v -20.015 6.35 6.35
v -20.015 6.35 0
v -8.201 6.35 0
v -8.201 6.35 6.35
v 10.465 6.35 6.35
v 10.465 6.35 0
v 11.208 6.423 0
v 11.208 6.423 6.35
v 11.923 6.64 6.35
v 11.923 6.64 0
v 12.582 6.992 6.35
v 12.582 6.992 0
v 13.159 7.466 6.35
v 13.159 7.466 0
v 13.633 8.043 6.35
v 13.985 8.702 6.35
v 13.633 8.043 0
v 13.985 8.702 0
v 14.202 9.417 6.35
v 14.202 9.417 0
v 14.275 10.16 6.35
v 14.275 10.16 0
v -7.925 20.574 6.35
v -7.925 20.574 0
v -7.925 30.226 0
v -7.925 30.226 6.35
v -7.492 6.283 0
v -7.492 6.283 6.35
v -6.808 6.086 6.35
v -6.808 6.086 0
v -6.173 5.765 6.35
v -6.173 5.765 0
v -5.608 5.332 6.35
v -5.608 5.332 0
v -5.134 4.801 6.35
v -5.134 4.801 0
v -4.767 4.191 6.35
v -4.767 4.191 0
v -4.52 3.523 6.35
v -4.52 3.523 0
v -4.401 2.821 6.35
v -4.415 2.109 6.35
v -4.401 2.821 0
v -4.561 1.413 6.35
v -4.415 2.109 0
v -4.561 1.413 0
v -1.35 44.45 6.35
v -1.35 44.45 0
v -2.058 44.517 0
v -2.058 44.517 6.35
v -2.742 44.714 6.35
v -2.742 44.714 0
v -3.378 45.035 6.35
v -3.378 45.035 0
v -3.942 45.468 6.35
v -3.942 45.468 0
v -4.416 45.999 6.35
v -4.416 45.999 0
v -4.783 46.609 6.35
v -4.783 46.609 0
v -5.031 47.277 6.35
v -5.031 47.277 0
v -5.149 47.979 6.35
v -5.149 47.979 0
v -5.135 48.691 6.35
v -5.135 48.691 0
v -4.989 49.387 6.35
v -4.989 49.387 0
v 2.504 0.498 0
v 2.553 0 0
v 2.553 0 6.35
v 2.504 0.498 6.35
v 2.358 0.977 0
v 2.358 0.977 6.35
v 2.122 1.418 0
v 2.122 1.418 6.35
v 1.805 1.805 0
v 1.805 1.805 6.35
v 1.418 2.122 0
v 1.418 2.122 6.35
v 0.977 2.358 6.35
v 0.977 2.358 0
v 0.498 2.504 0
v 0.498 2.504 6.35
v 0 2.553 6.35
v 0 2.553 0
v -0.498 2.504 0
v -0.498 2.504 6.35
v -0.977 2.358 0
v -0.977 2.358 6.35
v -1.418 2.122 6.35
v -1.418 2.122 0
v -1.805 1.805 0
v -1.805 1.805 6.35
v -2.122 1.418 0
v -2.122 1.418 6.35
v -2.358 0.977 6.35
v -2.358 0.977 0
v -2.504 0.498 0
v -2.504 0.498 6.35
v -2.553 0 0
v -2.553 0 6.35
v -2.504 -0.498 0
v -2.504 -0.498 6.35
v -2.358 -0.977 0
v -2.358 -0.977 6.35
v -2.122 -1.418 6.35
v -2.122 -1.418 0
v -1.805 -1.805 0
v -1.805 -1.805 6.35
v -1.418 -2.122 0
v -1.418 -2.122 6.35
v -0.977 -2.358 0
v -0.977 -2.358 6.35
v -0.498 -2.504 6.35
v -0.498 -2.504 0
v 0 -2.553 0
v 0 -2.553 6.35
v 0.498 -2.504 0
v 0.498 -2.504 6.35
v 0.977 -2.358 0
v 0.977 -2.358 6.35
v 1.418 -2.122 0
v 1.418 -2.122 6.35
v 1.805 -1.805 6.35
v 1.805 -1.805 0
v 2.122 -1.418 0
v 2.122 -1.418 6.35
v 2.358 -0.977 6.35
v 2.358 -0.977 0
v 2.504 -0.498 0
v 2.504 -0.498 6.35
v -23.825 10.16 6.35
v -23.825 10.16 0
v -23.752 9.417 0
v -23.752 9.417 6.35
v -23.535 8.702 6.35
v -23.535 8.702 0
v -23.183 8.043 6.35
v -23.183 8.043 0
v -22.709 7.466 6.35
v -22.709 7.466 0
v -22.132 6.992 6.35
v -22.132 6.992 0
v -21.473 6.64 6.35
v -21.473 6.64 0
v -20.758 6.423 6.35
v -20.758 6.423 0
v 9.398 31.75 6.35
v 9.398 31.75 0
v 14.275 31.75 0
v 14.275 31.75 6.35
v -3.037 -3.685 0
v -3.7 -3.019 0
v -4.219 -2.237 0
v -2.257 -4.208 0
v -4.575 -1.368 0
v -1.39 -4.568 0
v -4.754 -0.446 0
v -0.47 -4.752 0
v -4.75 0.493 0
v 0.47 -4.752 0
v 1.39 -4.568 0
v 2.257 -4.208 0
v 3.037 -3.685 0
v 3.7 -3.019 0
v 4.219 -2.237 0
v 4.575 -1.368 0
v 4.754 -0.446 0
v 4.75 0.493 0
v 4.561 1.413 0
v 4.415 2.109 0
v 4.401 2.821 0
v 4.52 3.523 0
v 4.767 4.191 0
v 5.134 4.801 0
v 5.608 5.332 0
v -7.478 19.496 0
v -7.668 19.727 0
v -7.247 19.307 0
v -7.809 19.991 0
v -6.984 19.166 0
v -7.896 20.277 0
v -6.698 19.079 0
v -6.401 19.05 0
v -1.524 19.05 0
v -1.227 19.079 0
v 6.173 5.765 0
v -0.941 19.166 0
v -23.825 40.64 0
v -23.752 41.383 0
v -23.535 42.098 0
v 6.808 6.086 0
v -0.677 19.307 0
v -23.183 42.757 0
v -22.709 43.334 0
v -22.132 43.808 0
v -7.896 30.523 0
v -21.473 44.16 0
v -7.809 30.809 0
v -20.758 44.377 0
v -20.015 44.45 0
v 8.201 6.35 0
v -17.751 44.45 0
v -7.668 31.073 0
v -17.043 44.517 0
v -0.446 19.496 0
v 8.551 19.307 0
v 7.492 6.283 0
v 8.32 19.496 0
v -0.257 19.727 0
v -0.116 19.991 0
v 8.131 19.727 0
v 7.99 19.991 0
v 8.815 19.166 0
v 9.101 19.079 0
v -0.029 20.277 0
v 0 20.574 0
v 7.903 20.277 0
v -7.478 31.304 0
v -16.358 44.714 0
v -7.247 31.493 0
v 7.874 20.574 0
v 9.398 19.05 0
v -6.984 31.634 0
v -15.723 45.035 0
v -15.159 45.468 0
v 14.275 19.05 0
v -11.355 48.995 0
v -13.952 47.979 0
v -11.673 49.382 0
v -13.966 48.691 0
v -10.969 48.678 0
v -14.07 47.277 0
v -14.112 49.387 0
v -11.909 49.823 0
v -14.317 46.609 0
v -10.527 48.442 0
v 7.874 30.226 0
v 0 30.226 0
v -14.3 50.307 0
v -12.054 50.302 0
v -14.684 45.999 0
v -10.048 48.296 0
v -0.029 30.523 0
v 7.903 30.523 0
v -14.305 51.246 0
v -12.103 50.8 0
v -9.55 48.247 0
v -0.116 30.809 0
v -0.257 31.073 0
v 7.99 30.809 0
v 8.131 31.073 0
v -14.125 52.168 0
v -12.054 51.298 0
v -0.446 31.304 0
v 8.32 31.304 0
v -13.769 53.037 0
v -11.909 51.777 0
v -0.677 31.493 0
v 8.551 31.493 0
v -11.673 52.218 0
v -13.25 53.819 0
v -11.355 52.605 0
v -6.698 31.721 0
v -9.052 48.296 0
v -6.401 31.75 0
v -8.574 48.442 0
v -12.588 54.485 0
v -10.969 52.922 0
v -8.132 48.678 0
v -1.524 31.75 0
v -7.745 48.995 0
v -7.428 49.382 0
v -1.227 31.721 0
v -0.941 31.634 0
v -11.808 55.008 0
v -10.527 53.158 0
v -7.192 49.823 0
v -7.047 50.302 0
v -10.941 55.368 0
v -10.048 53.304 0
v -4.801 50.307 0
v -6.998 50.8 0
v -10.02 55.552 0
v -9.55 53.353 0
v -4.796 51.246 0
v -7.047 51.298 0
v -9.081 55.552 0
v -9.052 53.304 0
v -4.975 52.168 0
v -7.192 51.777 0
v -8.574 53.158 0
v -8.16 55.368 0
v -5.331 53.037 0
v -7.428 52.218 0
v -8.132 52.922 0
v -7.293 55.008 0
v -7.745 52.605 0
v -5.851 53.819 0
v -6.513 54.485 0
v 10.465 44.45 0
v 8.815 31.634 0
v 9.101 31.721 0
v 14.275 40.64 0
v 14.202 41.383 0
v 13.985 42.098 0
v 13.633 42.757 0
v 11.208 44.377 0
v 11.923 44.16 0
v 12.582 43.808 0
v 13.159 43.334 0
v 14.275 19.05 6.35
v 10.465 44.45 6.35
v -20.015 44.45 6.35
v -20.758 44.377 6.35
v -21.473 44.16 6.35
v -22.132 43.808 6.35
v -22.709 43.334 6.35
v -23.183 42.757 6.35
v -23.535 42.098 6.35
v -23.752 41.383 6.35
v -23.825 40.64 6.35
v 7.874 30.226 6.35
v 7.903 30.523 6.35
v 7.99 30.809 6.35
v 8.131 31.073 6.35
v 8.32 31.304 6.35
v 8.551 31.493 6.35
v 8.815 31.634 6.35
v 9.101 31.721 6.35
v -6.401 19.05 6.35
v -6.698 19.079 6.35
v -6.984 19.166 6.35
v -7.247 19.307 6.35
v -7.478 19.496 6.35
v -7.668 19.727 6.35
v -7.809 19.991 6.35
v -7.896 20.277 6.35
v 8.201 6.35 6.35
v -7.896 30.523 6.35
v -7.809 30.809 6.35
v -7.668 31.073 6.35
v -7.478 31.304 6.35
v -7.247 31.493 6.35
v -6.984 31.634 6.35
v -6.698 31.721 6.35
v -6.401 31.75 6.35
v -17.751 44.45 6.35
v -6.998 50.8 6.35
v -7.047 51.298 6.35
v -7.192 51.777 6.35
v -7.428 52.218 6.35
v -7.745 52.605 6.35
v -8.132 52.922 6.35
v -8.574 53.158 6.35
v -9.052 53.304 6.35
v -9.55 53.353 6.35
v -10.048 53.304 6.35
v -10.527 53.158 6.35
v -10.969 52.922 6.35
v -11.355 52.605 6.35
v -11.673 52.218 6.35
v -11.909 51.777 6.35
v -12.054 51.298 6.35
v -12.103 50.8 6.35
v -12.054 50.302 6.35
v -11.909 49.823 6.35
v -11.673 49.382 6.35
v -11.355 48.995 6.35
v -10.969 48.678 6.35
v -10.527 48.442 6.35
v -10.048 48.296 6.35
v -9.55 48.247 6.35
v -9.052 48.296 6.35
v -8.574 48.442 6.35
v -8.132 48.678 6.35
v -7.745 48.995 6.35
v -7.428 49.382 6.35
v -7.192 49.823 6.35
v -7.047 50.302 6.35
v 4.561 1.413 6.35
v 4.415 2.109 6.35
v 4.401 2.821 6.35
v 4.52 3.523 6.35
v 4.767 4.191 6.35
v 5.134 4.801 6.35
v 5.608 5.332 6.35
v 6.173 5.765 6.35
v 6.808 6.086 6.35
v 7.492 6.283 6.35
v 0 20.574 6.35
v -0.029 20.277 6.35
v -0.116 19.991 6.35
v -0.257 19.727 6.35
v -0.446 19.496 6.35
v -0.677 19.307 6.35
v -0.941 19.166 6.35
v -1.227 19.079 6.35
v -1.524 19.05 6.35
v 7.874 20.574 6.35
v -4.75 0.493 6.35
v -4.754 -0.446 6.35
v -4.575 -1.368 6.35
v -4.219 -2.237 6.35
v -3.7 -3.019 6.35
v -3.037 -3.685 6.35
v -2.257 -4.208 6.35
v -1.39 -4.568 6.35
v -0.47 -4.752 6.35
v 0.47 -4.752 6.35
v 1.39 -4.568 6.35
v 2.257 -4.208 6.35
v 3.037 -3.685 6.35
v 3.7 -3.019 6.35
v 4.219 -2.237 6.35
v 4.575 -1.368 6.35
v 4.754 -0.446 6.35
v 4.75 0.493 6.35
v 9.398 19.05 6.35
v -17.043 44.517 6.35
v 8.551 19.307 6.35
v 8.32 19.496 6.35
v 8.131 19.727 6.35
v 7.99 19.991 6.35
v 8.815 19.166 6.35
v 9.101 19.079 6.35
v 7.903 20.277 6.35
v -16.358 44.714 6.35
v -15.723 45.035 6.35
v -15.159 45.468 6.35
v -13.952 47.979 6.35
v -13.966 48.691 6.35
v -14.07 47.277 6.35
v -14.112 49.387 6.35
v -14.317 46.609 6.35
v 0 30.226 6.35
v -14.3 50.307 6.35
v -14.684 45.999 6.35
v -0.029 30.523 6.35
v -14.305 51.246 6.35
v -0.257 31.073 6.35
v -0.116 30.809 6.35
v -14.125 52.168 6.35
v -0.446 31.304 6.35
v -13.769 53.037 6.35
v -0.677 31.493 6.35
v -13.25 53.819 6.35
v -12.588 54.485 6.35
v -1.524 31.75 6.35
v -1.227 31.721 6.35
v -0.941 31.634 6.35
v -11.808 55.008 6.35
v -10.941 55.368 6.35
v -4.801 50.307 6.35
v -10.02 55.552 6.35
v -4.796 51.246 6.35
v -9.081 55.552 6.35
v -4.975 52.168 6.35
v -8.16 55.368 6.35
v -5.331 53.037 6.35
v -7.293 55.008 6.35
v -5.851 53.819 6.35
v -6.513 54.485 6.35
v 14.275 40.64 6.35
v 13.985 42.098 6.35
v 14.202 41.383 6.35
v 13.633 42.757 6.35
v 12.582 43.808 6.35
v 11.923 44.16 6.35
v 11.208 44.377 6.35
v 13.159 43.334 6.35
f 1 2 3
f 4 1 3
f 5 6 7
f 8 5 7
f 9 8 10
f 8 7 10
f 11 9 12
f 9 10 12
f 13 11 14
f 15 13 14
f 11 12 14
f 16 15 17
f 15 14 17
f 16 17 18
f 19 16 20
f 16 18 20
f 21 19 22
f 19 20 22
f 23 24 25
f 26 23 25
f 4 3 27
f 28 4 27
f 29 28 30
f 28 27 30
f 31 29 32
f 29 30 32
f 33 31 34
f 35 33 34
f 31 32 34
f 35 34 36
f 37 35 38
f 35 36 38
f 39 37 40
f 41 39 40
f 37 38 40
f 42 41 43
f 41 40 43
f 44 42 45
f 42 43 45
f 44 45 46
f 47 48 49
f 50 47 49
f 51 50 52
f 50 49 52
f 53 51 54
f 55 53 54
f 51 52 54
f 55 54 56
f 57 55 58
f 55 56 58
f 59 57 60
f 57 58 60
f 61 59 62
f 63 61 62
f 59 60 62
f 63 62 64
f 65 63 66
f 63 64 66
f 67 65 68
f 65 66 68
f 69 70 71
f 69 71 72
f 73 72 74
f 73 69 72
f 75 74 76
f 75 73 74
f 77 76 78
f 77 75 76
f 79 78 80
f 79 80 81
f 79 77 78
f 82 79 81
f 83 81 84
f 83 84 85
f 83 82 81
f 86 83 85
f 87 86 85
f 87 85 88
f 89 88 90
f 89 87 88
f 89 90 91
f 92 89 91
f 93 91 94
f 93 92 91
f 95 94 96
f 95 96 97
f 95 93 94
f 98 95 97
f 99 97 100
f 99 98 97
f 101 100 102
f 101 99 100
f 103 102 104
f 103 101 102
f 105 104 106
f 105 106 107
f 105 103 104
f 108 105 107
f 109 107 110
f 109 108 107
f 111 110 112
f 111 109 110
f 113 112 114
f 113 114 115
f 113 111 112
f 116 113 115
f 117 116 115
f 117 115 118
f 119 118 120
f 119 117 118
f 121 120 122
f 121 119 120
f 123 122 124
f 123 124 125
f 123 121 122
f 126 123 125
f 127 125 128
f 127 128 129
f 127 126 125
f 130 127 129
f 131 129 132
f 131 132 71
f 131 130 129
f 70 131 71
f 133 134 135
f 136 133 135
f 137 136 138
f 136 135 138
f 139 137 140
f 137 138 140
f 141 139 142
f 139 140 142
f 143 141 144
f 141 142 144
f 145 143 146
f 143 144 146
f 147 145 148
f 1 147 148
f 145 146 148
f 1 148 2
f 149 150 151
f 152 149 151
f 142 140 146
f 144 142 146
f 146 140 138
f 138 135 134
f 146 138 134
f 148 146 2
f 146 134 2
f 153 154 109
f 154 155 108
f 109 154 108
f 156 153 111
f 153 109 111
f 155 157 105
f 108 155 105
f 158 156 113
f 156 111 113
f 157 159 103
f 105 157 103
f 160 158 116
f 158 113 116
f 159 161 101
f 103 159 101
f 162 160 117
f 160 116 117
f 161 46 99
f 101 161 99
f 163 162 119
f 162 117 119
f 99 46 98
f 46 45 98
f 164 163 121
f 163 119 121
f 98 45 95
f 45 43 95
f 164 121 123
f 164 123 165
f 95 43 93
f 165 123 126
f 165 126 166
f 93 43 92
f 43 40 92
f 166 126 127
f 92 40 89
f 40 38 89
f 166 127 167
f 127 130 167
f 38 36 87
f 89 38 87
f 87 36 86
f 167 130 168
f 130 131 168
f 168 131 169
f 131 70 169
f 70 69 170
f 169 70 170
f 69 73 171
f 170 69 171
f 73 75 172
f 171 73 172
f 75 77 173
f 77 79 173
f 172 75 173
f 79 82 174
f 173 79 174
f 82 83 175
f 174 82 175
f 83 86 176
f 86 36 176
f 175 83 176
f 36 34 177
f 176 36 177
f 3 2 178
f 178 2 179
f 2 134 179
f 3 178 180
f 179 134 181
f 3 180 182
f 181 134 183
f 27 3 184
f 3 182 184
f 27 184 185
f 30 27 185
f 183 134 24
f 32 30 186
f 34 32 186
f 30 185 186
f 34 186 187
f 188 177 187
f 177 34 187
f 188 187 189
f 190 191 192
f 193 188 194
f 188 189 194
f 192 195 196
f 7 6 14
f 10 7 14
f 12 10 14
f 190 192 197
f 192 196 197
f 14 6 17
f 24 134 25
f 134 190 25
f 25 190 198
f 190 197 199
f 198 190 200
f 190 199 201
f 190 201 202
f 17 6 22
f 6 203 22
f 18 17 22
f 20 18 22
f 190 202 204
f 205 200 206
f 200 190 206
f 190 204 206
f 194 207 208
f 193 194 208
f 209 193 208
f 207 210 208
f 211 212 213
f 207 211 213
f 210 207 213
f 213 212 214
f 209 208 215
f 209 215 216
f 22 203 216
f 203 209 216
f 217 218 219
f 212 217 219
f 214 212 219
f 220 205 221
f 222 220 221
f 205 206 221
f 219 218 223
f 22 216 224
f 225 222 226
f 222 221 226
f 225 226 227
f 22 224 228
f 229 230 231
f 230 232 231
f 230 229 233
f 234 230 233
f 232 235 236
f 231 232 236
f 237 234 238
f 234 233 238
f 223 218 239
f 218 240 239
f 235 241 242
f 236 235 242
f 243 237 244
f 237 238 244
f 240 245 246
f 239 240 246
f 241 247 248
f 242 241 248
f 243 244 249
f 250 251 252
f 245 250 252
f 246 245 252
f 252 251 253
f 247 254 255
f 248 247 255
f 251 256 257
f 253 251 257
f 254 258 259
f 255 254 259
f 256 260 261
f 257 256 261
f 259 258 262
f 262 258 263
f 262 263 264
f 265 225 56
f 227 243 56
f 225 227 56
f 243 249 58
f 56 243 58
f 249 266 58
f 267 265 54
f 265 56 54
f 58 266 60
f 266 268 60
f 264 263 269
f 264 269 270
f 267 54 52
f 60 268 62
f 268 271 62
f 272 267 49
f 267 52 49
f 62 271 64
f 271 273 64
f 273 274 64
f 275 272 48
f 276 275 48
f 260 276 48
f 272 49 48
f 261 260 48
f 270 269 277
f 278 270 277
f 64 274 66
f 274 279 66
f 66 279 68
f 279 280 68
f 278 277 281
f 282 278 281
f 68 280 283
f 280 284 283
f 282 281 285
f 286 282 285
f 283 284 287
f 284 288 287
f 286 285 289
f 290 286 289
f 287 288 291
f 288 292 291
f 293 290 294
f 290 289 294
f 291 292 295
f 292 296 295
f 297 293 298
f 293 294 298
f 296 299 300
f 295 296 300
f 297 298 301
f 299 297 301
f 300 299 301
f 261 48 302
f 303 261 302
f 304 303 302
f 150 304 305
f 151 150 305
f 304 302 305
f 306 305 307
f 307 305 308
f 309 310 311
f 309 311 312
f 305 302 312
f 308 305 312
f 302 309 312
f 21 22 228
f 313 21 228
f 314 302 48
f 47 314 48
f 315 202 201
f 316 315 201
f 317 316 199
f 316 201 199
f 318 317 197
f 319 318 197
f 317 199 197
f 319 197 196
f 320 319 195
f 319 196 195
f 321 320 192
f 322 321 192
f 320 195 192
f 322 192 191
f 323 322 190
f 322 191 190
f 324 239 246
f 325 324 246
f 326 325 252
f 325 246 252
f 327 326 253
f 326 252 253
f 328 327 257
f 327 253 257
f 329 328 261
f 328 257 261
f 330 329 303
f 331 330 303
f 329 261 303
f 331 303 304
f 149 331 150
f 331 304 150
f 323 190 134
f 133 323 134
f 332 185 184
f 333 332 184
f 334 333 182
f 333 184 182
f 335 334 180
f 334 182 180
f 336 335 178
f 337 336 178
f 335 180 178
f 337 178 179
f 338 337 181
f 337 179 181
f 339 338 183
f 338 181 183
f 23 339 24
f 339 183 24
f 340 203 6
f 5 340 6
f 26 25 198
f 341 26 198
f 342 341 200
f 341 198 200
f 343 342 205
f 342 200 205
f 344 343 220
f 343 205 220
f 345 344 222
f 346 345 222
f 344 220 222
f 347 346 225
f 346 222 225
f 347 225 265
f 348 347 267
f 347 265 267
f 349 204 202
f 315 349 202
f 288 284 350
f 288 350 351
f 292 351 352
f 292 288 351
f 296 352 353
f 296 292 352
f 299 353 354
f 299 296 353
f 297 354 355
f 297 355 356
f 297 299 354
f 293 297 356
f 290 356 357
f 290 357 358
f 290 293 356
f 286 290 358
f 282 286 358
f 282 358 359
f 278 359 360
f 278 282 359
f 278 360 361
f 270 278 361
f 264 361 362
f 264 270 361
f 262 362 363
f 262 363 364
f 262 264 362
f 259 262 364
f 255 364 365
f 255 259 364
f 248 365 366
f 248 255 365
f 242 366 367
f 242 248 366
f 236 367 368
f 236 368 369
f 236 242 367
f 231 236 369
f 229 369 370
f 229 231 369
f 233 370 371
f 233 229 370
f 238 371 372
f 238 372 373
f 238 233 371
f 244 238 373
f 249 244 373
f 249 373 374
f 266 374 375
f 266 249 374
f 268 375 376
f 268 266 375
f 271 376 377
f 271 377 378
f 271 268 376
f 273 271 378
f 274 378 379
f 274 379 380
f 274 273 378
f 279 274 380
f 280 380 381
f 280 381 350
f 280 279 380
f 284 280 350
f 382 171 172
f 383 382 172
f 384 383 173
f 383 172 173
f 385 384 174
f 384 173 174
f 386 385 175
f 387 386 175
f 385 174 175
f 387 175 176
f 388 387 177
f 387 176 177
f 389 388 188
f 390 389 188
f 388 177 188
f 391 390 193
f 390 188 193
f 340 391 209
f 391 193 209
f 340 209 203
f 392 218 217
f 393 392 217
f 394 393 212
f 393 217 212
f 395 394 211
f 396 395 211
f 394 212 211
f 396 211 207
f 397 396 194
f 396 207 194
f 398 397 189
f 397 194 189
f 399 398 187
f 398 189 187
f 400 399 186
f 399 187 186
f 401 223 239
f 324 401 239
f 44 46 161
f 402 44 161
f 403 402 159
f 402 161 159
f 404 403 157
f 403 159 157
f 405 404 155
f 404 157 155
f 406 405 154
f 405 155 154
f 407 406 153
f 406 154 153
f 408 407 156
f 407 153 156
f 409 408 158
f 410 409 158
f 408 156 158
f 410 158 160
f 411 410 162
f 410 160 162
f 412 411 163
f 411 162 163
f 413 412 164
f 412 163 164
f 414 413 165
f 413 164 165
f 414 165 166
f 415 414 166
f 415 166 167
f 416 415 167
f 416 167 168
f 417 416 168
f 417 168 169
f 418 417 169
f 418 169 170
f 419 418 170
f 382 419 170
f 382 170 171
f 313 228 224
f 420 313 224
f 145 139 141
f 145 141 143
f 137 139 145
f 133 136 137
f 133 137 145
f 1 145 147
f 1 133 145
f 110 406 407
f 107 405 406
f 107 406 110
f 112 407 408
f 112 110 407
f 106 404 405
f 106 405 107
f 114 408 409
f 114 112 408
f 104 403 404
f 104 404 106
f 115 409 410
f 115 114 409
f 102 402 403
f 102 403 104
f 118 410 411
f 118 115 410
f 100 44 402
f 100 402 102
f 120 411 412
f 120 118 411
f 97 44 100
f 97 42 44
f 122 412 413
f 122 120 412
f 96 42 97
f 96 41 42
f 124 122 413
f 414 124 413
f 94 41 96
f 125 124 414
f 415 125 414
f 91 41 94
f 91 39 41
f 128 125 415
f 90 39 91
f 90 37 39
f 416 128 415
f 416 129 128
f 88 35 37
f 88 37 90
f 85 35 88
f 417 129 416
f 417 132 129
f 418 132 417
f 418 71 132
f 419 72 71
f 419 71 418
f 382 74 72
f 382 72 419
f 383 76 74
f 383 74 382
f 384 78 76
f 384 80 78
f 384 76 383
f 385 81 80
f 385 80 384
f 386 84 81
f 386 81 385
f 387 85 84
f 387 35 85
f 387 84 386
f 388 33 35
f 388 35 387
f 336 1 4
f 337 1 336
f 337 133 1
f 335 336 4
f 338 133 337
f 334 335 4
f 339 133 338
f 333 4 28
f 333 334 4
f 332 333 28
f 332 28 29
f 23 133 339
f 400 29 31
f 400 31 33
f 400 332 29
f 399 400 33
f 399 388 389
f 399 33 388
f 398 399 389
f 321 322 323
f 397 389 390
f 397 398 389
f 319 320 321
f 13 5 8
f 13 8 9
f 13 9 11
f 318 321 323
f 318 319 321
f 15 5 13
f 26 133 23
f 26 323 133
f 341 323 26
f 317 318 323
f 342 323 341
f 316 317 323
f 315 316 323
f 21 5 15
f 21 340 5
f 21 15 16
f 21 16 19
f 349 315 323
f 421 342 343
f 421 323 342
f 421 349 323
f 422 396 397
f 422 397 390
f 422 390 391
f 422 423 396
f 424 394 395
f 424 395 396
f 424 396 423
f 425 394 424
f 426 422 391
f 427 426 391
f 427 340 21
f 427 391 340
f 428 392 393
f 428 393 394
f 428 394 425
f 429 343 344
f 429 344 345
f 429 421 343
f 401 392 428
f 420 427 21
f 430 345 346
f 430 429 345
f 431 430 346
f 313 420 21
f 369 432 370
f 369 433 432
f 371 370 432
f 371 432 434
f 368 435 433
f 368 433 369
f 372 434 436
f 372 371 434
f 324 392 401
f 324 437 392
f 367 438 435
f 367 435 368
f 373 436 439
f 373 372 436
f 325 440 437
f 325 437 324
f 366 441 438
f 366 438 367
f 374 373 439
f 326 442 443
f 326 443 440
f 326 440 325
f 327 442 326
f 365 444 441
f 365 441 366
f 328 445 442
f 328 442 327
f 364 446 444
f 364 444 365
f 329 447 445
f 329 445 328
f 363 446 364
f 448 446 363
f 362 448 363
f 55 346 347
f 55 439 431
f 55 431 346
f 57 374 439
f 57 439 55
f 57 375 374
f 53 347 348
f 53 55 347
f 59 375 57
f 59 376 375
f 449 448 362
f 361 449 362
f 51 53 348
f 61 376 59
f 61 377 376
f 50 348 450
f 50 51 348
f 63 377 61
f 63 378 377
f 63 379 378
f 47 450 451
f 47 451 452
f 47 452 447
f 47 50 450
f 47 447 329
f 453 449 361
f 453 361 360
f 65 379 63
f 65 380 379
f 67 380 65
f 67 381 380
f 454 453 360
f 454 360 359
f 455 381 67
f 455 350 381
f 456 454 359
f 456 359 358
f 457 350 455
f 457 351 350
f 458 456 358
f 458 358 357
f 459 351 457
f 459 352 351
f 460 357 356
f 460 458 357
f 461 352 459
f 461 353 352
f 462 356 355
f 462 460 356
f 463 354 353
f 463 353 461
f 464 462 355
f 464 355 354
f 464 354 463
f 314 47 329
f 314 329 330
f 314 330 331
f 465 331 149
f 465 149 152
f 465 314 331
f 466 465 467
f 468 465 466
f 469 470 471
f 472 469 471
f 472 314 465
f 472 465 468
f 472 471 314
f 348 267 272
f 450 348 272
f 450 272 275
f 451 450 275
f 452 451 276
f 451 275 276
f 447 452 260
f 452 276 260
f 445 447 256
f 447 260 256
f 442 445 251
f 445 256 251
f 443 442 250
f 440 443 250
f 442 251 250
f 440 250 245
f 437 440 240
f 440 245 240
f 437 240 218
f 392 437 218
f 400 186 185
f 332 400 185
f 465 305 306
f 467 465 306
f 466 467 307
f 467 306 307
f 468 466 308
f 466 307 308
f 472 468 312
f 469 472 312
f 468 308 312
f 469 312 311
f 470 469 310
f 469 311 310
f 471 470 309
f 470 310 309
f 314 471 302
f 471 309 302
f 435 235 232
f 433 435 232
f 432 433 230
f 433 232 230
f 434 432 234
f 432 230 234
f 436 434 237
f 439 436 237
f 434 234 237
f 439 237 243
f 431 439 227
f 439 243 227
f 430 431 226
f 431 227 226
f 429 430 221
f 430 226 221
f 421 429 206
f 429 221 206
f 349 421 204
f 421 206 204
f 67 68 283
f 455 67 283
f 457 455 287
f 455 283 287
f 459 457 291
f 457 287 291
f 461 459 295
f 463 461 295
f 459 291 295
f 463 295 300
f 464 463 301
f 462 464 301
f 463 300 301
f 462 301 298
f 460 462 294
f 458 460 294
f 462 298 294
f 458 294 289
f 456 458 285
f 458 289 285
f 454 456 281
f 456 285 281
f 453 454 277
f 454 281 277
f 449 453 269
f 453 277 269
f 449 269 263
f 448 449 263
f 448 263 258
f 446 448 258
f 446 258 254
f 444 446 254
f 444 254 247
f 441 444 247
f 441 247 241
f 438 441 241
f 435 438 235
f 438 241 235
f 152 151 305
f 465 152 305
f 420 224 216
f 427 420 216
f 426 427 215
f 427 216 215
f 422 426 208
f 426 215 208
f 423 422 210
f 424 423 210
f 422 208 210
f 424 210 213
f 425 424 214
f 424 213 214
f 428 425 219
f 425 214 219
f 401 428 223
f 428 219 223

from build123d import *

# Parameters (mm, degrees)
SKETCH1_R           = 2.5527
BOSS_EXTRUDE1_DEPTH = 6.35


with BuildPart() as part:
    # Sketch1 → Boss-Extrude1 (new body)
    with BuildSketch(Plane.XY):
        with BuildLine():
            Line((-17.751257214, 44.45), (-20.0152, 44.45))
            ThreePointArc((-20.0152, 44.45), (-22.709276836, 43.334076836), (-23.8252, 40.64))
            Line((-23.8252, 40.64), (-23.8252, 10.16))
            ThreePointArc((-23.8252, 10.16), (-22.709276836, 7.465923164), (-20.0152, 6.35))
            Line((-20.0152, 6.35), (-8.200857214, 6.35))
            ThreePointArc((-8.200857214, 6.35), (-5.134034416, 4.800685279), (-4.561423539, 1.412781065))
            ThreePointArc((-4.561423539, 1.412781065), (0, -4.7752), (4.561423539, 1.412781065))
            ThreePointArc((4.561423539, 1.412781065), (5.134034416, 4.800685279), (8.200857214, 6.35))
            Line((8.200857214, 6.35), (10.4648, 6.35))
            ThreePointArc((10.4648, 6.35), (13.158876836, 7.465923164), (14.2748, 10.16))
            Line((14.2748, 10.16), (14.2748, 19.05))
            Line((14.2748, 19.05), (9.398, 19.05))
            ThreePointArc((9.398, 19.05), (8.320369265, 19.496369265), (7.874, 20.574))
            Line((7.874, 20.574), (7.874, 30.226))
            ThreePointArc((7.874, 30.226), (8.320369265, 31.303630735), (9.398, 31.75))
            Line((9.398, 31.75), (14.2748, 31.75))
            Line((14.2748, 31.75), (14.2748, 40.64))
            ThreePointArc((14.2748, 40.64), (13.158876836, 43.334076836), (10.4648, 44.45))
            Line((10.4648, 44.45), (-1.349542786, 44.45))
            ThreePointArc((-1.349542786, 44.45), (-4.416365584, 45.999314721), (-4.988976461, 49.387218935))
            ThreePointArc((-4.988976461, 49.387218935), (-9.5504, 55.5752), (-14.111823539, 49.387218935))
            ThreePointArc((-14.111823539, 49.387218935), (-14.684434416, 45.999314721), (-17.751257214, 44.45))
        make_face()
        Circle(SKETCH1_R, mode=Mode.SUBTRACT)
        with Locations((-9.5504, 50.8)):
            Circle(SKETCH1_R, mode=Mode.SUBTRACT)
        with BuildLine():
            ThreePointArc((-7.9248, 30.226), (-7.478430735, 31.303630735), (-6.4008, 31.75))
            Line((-6.4008, 31.75), (-1.524, 31.75))
            ThreePointArc((-1.524, 31.75), (-0.446369265, 31.303630735), (0, 30.226))
            Line((0, 30.226), (0, 20.574))
            ThreePointArc((0, 20.574), (-0.446369265, 19.496369265), (-1.524, 19.05))
            Line((-1.524, 19.05), (-6.4008, 19.05))
            ThreePointArc((-6.4008, 19.05), (-7.478430735, 19.496369265), (-7.9248, 20.574))
            Line((-7.9248, 20.574), (-7.9248, 30.226))
        make_face(mode=Mode.SUBTRACT)
    extrude(amount=BOSS_EXTRUDE1_DEPTH)


solid = part.part
